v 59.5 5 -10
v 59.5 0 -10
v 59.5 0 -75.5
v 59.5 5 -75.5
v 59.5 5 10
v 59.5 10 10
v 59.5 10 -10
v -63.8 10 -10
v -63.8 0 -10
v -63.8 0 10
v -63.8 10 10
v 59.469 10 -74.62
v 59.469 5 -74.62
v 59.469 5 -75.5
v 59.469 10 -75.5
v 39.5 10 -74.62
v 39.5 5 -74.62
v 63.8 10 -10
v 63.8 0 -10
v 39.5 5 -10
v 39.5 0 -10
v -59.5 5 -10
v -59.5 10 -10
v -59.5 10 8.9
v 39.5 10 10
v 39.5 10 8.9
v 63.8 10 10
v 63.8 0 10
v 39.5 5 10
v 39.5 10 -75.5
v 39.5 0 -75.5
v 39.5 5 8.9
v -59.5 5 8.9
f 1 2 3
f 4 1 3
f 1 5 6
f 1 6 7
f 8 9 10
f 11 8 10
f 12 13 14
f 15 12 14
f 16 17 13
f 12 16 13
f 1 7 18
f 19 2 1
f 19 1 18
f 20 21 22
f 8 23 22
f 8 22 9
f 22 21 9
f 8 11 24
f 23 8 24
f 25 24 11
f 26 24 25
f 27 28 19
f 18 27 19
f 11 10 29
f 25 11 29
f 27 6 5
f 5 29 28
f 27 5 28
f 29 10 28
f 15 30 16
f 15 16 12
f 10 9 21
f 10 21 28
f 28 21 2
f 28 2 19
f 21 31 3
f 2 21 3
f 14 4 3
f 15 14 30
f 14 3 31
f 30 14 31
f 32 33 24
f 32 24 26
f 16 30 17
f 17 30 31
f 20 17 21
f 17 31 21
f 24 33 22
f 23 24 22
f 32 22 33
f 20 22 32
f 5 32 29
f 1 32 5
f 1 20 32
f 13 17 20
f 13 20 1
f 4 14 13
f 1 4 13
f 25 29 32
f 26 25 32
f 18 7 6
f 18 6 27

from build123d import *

# Parameters (mm, degrees)
EXTRUDE_6_DEPTH   = 10
SKETCH_1_W        = 4.3
SKETCH_1_H        = 20
EXTRUDE_6_2_DEPTH = 10
SKETCH_1_W_2      = 19.968743504
SKETCH_1_H_2      = 0.87958721
EXTRUDE_6_3_DEPTH = 10
EXTRUDE_7_DEPTH   = 5


with BuildPart() as part:
    # 草图1 → 凸台-拉伸6 (new body)
    with BuildSketch(Plane(origin=(0, 0, 0), x_dir=(1, 0, 0), z_dir=(0, 1, 0))):
        Polygon((-63.8, 10), (-63.8, -10), (39.5, -10), (39.5, -8.900223152), (-59.5, -8.900223152), (-59.5, 10), align=None)
    extrude(amount=EXTRUDE_6_DEPTH)



with BuildPart() as body_2:
    # 草图1 → Extrude 6 2 (new body)
    with BuildSketch(Plane(origin=(0, 0, 0), x_dir=(1, 0, 0), z_dir=(0, 1, 0))):
        with Locations((61.65, 0)):
            Rectangle(SKETCH_1_W, SKETCH_1_H)
    extrude(amount=EXTRUDE_6_2_DEPTH)


with BuildPart() as body_3:
    # 草图1 → Extrude 6 3 (new body)
    with BuildSketch(Plane(origin=(0, 0, 0), x_dir=(1, 0, 0), z_dir=(0, 1, 0))):
        with Locations((49.484371752, 75.060206395)):
            Rectangle(SKETCH_1_W_2, SKETCH_1_H_2)
    extrude(amount=EXTRUDE_6_3_DEPTH)


with BuildPart() as part_1:
    add(part.part)

    add(body_2.part)  # 凸台-拉伸7 merges body 2

    add(body_3.part)  # 凸台-拉伸7 merges body 3
    # 草图1<15> → 凸台-拉伸7 (add)
    with BuildSketch(Plane(origin=(0, 0, 0), x_dir=(1, 0, 0), z_dir=(0, 1, 0))):
        Polygon((39.5, -8.900223152), (39.5, -10), (59.5, -10), (59.5, 75.5), (59.468743504, 75.5), (59.468743504, 74.62041279), (39.5, 74.62041279), (39.5, 10), (-59.5, 10), (-59.5, -8.900223152), align=None)
    extrude(amount=EXTRUDE_7_DEPTH)


solid = part_1.part
